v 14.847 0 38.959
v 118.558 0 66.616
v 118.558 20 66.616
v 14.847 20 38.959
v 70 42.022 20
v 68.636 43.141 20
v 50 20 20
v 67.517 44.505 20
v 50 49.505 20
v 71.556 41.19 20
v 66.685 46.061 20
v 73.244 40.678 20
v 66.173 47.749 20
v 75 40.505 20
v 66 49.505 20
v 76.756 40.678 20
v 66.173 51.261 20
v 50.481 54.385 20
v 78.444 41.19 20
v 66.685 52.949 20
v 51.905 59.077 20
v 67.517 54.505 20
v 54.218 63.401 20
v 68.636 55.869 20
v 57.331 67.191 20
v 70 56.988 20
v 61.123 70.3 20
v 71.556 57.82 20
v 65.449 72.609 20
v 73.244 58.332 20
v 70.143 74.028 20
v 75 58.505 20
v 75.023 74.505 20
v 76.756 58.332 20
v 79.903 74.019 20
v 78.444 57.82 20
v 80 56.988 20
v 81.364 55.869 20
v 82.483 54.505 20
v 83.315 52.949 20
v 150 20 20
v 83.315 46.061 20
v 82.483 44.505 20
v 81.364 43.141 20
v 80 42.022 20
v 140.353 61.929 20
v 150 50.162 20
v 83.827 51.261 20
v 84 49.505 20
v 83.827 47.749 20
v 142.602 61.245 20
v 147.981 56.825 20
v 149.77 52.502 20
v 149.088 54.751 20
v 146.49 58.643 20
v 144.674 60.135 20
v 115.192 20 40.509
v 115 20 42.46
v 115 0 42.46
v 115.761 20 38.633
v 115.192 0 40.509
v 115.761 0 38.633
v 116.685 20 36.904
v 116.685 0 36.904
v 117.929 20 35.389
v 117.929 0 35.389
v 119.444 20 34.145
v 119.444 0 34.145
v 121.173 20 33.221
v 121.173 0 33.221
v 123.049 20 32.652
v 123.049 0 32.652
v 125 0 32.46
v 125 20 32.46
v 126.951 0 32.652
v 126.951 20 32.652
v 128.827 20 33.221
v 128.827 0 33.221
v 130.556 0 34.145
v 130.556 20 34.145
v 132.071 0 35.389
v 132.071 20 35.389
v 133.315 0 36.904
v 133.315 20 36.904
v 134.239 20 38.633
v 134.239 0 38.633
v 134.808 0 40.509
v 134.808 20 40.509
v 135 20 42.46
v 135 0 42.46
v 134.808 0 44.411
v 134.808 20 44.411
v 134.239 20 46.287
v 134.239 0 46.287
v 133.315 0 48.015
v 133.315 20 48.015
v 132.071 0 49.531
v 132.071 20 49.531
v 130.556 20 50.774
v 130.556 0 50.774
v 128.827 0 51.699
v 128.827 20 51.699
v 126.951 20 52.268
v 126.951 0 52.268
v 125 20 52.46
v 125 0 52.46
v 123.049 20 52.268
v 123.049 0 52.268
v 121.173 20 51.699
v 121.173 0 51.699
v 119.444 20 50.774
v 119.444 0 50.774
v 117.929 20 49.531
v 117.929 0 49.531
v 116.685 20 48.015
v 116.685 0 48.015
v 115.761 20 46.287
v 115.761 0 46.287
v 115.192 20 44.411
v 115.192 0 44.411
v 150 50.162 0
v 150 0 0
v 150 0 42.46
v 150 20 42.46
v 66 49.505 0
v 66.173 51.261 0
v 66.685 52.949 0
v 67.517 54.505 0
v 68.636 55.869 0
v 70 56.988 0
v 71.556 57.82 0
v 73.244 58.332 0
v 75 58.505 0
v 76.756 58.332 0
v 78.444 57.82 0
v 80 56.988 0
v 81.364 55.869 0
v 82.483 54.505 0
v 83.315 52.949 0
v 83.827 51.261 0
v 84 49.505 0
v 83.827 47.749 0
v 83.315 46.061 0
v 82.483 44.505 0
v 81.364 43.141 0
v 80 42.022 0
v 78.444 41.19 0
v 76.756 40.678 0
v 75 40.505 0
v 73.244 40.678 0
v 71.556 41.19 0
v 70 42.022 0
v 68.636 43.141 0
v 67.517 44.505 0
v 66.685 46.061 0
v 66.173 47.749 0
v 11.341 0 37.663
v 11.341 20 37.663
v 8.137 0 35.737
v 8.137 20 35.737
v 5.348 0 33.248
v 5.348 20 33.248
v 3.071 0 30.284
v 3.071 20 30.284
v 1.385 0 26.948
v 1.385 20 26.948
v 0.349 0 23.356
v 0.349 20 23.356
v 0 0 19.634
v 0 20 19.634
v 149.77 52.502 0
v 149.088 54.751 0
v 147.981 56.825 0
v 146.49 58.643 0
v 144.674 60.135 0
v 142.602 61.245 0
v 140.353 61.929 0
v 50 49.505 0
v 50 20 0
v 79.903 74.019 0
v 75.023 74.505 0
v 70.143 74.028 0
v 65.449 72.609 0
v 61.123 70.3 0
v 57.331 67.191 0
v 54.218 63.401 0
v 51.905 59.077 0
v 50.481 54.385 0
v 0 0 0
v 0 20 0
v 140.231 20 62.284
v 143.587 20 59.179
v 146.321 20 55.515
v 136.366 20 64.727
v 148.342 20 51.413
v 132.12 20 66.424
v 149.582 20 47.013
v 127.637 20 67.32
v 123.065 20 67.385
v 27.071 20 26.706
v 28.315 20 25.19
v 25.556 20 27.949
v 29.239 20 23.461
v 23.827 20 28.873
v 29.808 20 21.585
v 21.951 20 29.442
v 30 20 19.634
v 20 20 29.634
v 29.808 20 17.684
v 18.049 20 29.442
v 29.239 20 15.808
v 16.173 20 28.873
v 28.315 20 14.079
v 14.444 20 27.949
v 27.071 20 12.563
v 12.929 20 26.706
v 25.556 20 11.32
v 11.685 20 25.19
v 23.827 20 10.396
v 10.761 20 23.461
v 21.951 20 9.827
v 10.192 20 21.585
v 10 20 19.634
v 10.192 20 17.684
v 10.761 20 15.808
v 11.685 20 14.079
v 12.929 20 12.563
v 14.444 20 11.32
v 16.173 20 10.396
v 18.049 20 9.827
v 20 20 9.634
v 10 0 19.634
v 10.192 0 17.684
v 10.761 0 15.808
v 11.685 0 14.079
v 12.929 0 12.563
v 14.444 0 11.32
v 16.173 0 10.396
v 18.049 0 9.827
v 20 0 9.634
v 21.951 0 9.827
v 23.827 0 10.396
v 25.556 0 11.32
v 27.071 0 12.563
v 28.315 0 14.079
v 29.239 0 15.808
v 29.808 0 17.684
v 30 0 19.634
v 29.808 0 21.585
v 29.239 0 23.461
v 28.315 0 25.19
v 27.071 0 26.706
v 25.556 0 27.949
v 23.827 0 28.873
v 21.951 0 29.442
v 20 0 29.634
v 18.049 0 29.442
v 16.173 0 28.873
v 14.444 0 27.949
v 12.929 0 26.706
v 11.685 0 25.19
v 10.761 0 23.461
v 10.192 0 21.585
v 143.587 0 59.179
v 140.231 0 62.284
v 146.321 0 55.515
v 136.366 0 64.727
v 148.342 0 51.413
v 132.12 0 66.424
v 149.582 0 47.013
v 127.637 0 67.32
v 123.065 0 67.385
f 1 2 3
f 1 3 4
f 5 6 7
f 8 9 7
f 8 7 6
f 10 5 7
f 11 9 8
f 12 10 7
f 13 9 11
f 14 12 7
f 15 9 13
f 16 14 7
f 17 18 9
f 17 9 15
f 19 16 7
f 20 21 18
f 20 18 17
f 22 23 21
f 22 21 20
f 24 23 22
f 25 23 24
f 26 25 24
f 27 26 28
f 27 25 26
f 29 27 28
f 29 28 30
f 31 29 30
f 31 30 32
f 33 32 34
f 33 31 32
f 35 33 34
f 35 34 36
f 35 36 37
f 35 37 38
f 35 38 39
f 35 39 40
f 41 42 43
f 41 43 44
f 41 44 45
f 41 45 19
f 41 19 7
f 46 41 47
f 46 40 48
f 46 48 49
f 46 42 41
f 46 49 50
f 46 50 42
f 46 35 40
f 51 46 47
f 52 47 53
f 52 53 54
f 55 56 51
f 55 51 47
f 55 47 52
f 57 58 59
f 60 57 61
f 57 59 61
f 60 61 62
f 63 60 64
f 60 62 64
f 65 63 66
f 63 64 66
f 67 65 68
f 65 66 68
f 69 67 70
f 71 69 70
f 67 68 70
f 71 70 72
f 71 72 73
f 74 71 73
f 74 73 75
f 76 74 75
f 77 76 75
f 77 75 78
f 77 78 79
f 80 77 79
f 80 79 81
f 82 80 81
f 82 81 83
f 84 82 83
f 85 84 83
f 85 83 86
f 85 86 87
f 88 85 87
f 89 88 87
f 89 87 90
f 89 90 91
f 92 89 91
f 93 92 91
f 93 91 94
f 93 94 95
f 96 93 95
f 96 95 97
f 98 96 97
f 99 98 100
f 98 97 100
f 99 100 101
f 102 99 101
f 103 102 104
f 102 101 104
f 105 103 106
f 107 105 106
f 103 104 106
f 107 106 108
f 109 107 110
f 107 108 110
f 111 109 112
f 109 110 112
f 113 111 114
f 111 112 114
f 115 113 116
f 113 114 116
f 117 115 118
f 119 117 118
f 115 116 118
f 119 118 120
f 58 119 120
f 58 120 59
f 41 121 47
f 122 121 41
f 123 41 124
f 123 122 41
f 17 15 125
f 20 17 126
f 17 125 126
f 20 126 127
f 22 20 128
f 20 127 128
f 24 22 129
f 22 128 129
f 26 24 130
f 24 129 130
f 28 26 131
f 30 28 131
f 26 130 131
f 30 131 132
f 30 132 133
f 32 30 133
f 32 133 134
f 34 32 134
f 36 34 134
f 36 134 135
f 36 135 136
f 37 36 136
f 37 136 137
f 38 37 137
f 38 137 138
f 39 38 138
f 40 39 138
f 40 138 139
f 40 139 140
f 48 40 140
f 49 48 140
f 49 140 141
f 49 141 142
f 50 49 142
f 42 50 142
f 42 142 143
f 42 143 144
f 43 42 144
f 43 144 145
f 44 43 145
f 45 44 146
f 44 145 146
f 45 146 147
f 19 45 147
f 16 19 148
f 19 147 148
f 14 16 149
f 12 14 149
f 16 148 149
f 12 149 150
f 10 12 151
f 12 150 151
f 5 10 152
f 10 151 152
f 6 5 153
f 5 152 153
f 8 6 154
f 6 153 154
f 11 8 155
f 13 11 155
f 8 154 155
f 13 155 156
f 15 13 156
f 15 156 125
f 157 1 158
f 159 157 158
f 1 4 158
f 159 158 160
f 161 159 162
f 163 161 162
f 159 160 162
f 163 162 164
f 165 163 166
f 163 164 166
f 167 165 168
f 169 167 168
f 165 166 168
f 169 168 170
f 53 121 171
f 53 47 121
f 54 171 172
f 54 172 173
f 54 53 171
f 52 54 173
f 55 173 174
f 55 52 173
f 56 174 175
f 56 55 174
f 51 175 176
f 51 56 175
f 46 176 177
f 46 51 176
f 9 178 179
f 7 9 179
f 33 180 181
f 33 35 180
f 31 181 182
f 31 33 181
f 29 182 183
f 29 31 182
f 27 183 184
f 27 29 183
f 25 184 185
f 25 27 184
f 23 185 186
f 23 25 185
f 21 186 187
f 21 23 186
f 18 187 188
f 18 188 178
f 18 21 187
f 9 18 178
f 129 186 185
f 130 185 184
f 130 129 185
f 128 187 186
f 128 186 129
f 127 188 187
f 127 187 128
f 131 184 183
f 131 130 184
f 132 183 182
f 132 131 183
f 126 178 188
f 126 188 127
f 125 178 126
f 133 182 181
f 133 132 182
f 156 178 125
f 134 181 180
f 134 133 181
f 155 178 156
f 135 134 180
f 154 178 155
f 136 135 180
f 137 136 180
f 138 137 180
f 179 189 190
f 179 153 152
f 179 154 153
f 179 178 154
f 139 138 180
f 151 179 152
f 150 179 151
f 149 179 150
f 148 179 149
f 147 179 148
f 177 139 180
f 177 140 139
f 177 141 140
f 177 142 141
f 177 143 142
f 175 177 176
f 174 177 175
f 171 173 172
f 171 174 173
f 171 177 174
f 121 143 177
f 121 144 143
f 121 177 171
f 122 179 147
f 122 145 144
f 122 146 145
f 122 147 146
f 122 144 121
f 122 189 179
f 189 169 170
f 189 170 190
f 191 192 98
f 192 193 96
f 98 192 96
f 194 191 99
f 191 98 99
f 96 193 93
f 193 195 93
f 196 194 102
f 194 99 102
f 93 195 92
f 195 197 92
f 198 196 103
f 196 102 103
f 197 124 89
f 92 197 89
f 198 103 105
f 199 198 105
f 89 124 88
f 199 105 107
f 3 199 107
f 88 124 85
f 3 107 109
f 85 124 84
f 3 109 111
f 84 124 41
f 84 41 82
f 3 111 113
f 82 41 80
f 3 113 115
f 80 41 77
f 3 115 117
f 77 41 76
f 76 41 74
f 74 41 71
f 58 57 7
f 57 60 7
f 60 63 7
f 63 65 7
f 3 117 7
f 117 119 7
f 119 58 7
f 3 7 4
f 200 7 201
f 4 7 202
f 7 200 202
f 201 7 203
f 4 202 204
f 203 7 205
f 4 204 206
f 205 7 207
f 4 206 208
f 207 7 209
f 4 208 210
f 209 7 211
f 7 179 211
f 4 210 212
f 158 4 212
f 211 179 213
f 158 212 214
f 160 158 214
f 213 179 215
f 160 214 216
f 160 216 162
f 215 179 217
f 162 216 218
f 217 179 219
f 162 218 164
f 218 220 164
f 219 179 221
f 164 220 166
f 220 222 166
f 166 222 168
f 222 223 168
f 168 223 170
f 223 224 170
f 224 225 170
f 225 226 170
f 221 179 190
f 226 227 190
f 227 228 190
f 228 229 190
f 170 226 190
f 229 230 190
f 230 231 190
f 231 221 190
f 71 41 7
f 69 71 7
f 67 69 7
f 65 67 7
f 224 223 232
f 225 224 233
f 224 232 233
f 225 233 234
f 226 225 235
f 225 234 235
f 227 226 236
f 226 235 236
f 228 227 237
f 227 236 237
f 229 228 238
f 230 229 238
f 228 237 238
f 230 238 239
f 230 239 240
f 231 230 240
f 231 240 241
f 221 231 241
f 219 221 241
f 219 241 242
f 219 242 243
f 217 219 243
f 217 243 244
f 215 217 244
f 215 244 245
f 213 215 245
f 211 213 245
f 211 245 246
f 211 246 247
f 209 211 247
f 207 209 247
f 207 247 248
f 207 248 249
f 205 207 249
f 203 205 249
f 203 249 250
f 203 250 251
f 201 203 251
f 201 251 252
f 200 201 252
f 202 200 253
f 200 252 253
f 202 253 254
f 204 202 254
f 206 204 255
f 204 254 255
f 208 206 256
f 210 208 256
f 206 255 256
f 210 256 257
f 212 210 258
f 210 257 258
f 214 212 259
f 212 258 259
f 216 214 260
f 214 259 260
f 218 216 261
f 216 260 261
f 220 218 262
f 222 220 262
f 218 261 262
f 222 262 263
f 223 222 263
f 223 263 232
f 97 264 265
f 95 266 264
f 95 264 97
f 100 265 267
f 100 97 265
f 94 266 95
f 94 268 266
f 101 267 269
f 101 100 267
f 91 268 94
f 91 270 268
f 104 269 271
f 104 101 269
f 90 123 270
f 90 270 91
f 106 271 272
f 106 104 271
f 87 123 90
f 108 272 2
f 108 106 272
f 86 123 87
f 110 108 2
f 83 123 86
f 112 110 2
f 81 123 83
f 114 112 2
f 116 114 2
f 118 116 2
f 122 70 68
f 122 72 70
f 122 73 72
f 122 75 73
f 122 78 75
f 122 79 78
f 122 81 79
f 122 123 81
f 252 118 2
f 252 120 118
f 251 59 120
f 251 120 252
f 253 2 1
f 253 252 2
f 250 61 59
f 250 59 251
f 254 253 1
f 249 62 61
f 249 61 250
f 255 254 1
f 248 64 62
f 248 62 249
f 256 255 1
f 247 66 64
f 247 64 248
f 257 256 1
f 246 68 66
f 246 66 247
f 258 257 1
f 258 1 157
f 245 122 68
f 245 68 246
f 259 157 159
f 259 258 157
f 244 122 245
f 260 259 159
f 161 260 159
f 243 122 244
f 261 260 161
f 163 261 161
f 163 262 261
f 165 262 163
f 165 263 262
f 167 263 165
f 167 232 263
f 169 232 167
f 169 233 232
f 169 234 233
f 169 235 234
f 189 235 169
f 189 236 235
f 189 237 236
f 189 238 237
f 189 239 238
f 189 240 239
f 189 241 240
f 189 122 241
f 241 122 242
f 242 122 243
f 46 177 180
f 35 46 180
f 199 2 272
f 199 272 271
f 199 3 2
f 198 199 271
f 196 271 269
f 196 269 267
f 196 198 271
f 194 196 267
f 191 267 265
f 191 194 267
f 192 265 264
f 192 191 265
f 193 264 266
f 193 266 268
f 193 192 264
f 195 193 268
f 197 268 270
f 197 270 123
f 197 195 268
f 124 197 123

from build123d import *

# Parameters (mm, degrees)
BOSS_EXTRUDE1_DEPTH        = 20
BOSS_EXTRUDE2_DEPTH        = 20
FILLET1_R                  = 20
FILLET2_R                  = 25
FILLET3_R                  = 12
F_20_0_20_DIAMETER_HOLE1_D = 20
F_18_0_18_DIAMETER_HOLE1_D = 18


with BuildPart() as part:
    # Sketch1 → Boss-Extrude1 (new body)
    with BuildSketch(Plane(origin=(0, 0, 0), x_dir=(1, 0, 0), z_dir=(0, 1, 0))):
        Polygon((0, 0), (150, 0), (150, -75), (0, -35), align=None)
    extrude(amount=BOSS_EXTRUDE1_DEPTH)

    # Sketch2 → Boss-Extrude2 (add)
    with BuildSketch(Plane(origin=(0, 0, 0), x_dir=(-1, 0, 0), z_dir=(0, 0, -1))):
        Polygon((-50, 0), (-150, 0), (-150, 60), (-50, 80), align=None)
    extrude(amount=-BOSS_EXTRUDE2_DEPTH)

    # Fillet1
    fillet1_edges = [part.edges().sort_by_distance(p)[0] for p in [
        (0, 10, 35),
    ]]
    fillet(fillet1_edges, radius=FILLET1_R)

    # Fillet2
    fillet2_edges = [part.edges().sort_by_distance(p)[0] for p in [
        (50, 80, 10),
        (150, 10, 75),
    ]]
    fillet(fillet2_edges, radius=FILLET2_R)

    # Fillet3
    fillet3_edges = [part.edges().sort_by_distance(p)[0] for p in [
        (150, 60, 10),
    ]]
    fillet(fillet3_edges, radius=FILLET3_R)

    # Ø20.0 (20) Diameter Hole1 (through all)
    with Locations(Plane(origin=(0, 20, 0), x_dir=(1, 0, 0), z_dir=(0, 1, 0))):
        with Locations((20, -19.634433738), (125, -42.45970884)):
            Hole(F_20_0_20_DIAMETER_HOLE1_D / 2)

    # Ø18.0 (18) Diameter Hole1 (through all)
    with Locations(Plane.XY.offset(20)):
        with Locations((75, 49.504902432)):
            Hole(F_18_0_18_DIAMETER_HOLE1_D / 2)


solid = part.part
